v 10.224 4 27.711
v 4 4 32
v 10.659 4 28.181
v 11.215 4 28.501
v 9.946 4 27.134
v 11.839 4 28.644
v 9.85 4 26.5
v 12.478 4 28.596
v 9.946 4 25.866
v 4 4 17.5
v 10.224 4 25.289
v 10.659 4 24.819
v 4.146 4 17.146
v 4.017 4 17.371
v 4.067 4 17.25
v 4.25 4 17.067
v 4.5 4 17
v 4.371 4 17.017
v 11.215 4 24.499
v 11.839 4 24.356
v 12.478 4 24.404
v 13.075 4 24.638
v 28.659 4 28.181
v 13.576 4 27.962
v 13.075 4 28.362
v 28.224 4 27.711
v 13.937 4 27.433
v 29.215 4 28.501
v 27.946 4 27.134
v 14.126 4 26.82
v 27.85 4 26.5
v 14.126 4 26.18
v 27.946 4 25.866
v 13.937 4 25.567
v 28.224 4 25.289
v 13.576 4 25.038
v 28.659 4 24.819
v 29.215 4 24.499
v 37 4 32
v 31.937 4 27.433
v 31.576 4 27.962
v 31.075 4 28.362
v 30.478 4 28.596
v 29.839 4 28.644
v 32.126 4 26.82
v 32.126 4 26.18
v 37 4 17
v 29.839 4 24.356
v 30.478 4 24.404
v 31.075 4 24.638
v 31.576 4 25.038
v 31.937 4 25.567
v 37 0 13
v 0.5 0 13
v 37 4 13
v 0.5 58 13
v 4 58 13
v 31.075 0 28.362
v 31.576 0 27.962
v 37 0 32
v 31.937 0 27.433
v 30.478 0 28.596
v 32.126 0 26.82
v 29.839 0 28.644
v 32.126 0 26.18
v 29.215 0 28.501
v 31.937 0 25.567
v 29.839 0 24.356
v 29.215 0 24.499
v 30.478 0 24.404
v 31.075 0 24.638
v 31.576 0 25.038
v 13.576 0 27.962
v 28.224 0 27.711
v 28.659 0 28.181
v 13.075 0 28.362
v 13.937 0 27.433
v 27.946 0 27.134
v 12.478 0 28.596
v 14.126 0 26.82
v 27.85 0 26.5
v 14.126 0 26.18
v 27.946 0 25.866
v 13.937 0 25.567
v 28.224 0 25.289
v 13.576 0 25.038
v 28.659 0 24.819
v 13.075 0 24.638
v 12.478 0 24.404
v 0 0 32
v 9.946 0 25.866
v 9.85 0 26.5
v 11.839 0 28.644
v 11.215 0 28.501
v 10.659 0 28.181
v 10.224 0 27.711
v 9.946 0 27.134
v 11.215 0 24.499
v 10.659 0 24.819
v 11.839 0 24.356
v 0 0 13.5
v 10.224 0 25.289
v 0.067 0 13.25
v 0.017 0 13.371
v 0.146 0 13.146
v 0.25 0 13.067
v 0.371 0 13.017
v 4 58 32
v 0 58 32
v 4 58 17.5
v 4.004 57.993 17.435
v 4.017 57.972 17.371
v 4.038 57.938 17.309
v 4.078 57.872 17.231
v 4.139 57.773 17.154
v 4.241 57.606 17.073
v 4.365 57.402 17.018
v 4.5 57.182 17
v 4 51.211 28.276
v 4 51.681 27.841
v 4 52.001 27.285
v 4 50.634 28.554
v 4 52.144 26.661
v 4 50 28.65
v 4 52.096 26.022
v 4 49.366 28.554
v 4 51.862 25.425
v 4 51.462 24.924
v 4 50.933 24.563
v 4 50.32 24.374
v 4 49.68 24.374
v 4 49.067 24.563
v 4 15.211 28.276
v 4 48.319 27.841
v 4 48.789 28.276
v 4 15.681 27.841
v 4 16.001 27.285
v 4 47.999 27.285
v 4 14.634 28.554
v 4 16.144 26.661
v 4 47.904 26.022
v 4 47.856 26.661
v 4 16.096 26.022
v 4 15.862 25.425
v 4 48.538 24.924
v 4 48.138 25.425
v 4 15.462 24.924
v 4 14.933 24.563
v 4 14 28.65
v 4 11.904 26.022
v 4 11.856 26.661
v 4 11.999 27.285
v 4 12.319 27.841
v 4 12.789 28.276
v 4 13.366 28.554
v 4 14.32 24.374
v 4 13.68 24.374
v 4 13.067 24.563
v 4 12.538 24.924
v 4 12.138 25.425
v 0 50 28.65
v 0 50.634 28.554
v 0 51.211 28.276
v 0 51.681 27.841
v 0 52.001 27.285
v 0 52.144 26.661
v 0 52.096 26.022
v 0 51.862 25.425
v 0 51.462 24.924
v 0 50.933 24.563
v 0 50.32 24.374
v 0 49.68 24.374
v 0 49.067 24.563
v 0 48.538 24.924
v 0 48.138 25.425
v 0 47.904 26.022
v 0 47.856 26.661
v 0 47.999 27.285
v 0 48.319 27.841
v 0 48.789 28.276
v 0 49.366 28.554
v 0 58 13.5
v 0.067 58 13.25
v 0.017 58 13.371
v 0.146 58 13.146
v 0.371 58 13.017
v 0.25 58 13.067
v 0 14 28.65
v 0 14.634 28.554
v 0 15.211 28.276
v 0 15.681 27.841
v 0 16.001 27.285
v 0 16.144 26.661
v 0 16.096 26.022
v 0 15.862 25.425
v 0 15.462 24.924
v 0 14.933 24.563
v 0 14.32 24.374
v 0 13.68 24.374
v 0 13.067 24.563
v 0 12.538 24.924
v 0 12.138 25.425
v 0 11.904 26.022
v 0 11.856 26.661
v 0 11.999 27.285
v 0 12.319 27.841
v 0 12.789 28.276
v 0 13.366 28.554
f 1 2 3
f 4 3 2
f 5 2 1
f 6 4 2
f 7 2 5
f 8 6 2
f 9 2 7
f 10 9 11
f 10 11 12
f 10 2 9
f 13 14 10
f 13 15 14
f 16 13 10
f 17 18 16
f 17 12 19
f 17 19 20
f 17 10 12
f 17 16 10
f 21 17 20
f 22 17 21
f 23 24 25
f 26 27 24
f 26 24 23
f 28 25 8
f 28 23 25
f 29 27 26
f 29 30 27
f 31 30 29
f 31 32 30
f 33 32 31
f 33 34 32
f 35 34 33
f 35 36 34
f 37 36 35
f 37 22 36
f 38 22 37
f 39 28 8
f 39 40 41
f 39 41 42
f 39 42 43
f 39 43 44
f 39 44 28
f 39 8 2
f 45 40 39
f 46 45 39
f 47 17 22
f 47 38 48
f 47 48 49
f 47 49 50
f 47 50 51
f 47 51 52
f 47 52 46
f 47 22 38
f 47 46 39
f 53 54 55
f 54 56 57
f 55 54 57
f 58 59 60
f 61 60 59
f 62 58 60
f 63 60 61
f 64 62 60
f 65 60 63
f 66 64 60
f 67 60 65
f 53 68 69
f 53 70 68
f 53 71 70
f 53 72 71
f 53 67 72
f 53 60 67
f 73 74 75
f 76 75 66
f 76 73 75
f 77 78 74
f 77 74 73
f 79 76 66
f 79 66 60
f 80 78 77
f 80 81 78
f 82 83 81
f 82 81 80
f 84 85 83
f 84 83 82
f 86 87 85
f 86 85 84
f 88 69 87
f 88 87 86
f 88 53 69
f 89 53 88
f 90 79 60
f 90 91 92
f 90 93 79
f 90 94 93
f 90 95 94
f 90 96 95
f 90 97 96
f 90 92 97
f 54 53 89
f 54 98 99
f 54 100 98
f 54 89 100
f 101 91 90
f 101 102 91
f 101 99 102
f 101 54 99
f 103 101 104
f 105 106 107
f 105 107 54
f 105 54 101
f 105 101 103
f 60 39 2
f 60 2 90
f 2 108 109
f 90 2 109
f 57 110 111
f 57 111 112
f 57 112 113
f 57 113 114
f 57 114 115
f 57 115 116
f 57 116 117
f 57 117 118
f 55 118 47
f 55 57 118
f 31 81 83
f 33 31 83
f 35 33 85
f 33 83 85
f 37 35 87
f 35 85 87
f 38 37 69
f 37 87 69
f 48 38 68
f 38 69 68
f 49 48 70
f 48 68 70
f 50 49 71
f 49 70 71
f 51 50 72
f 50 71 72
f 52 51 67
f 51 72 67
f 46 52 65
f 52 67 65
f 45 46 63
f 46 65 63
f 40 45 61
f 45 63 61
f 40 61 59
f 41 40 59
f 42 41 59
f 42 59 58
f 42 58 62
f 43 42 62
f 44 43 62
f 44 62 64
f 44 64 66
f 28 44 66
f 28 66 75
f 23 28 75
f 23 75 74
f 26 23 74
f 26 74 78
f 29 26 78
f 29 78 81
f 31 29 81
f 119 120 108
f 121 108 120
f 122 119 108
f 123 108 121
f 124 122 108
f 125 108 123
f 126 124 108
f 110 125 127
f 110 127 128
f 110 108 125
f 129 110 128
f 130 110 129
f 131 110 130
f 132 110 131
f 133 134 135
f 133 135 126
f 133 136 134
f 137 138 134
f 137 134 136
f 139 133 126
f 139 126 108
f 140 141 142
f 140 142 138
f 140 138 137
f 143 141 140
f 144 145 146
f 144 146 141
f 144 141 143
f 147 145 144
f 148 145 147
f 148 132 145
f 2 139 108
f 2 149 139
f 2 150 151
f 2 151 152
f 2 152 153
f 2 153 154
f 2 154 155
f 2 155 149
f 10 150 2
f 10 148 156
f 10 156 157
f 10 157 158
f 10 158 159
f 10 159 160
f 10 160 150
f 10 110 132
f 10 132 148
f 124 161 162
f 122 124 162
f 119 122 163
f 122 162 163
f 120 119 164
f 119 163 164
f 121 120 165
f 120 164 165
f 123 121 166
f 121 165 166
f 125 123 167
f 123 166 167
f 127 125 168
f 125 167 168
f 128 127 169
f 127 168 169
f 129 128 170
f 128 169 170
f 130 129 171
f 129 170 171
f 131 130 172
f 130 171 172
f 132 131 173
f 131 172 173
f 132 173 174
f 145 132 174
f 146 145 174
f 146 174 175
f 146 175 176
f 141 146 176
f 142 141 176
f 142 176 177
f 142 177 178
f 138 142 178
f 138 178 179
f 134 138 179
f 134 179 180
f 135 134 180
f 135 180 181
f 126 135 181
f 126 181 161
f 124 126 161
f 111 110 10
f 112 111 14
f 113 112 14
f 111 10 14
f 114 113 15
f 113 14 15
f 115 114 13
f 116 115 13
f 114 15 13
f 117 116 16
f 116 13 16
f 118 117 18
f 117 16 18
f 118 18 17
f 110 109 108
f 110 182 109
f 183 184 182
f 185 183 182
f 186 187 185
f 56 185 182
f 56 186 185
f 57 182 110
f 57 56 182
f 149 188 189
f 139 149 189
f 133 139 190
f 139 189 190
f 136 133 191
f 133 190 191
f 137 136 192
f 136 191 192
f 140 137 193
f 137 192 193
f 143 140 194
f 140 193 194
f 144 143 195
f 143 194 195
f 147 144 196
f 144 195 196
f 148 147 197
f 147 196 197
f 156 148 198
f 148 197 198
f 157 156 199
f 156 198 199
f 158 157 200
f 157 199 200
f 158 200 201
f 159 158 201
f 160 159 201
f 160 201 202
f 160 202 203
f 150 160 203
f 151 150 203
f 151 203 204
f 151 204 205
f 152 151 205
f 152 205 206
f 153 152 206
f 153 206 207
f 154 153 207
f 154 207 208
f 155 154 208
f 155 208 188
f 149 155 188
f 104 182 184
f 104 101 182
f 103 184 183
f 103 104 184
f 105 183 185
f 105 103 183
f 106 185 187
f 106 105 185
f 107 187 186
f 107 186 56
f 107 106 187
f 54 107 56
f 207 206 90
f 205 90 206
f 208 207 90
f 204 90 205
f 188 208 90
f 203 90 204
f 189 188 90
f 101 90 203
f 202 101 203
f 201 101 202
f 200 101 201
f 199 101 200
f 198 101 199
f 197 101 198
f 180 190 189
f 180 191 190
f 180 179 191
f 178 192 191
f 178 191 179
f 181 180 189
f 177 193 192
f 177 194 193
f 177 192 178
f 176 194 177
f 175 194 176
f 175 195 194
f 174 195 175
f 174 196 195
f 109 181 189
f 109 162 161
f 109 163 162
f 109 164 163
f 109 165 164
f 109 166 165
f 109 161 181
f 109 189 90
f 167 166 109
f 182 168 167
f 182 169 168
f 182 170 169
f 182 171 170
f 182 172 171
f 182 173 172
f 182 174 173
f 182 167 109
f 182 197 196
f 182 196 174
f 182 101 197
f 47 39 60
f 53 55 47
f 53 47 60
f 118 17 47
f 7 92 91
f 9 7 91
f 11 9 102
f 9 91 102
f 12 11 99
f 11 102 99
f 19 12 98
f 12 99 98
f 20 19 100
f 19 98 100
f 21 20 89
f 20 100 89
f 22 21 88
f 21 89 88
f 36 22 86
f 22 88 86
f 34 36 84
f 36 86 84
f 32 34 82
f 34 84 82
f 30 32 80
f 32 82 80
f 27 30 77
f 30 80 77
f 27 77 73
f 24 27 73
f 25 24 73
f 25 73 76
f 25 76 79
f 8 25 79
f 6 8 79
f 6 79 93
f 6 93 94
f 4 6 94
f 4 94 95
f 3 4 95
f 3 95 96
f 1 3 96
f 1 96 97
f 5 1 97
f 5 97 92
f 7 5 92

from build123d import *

# Parameters (mm, degrees)
SKETCH1_W               = 37
SKETCH1_H               = 58
BOSS_EXTRUDE1_DEPTH     = 30
SKETCH2_W               = 33
SKETCH2_H               = 13
CUT_EXTRUDE1_DEPTH      = 54
CUT_EXTRUDE2_DEPTH      = 46
M4_CLEARANCE_HOLE1_D    = 4.3
M4_CLEARANCE_HOLE2_D    = 4.3
SKETCH8_W               = 37
SKETCH8_H               = 13
CUT_EXTRUDE3_DEPTH      = 55
CUT_EXTRUDE3_DEPTH_BACK = 10
FILLET1_R               = 0.5
BOSS_EXTRUDE2_DEPTH     = 2


with BuildPart() as part:
    # Sketch1 → Boss-Extrude1 (new body)
    with BuildSketch(Plane.XY):
        with Locations((18.5, 29)):
            Rectangle(SKETCH1_W, SKETCH1_H)
    extrude(amount=BOSS_EXTRUDE1_DEPTH)

    # Sketch2 → Cut-Extrude1 (cut)
    with BuildSketch(Plane(origin=(0, 58, 0), x_dir=(1, 0, 0), z_dir=(0, 1, 0))):
        with Locations((20.5, -6.5)):
            Rectangle(SKETCH2_W, SKETCH2_H)
        with Locations((20.5, -23.5)):
            Rectangle(SKETCH2_W, SKETCH2_H)
    extrude(amount=-CUT_EXTRUDE1_DEPTH, mode=Mode.SUBTRACT)

    # Sketch3 → Cut-Extrude2 (cut)
    with BuildSketch(Plane.XY.offset(13)):
        Polygon((4, 58), (37, 4), (37, 58), align=None)
    extrude(amount=CUT_EXTRUDE2_DEPTH, mode=Mode.SUBTRACT)

    # M4 Clearance Hole1 (through all)
    with Locations(Plane(origin=(4, 0, 0), x_dir=(0, 0, -1), z_dir=(1, 0, 0))):
        with Locations((-26.5, 14), (-26.5, 50)):
            Hole(M4_CLEARANCE_HOLE1_D / 2)

    # M4 Clearance Hole2 (through all)
    with Locations(Plane(origin=(0, 4, 0), x_dir=(1, 0, 0), z_dir=(0, 1, 0))):
        with Locations((12, -26.5), (30, -26.5)):
            Hole(M4_CLEARANCE_HOLE2_D / 2)

    # Sketch8 → Cut-Extrude3 (cut, two sides)
    with BuildSketch(Plane(origin=(0, 4, 0), x_dir=(1, 0, 0), z_dir=(0, 1, 0))) as cut_extrude3_sk:
        with Locations((18.5, -6.5)):
            Rectangle(SKETCH8_W, SKETCH8_H)
    extrude(amount=CUT_EXTRUDE3_DEPTH, mode=Mode.SUBTRACT)
    extrude(cut_extrude3_sk.sketch, amount=-CUT_EXTRUDE3_DEPTH_BACK, mode=Mode.SUBTRACT)

    # Fillet1
    fillet1_edges = [part.edges().sort_by_distance(p)[0] for p in [
        (4, 31, 17),
        (0, 29, 13),
    ]]
    fillet(fillet1_edges, radius=FILLET1_R)

    # Sketch9 → Boss-Extrude2 (add)
    with BuildSketch(Plane.XY.offset(30)):
        Polygon((0, 58), (4, 58), (4, 4), (37, 4), (37, 0), (0, 0), align=None)
    extrude(amount=BOSS_EXTRUDE2_DEPTH)


solid = part.part
